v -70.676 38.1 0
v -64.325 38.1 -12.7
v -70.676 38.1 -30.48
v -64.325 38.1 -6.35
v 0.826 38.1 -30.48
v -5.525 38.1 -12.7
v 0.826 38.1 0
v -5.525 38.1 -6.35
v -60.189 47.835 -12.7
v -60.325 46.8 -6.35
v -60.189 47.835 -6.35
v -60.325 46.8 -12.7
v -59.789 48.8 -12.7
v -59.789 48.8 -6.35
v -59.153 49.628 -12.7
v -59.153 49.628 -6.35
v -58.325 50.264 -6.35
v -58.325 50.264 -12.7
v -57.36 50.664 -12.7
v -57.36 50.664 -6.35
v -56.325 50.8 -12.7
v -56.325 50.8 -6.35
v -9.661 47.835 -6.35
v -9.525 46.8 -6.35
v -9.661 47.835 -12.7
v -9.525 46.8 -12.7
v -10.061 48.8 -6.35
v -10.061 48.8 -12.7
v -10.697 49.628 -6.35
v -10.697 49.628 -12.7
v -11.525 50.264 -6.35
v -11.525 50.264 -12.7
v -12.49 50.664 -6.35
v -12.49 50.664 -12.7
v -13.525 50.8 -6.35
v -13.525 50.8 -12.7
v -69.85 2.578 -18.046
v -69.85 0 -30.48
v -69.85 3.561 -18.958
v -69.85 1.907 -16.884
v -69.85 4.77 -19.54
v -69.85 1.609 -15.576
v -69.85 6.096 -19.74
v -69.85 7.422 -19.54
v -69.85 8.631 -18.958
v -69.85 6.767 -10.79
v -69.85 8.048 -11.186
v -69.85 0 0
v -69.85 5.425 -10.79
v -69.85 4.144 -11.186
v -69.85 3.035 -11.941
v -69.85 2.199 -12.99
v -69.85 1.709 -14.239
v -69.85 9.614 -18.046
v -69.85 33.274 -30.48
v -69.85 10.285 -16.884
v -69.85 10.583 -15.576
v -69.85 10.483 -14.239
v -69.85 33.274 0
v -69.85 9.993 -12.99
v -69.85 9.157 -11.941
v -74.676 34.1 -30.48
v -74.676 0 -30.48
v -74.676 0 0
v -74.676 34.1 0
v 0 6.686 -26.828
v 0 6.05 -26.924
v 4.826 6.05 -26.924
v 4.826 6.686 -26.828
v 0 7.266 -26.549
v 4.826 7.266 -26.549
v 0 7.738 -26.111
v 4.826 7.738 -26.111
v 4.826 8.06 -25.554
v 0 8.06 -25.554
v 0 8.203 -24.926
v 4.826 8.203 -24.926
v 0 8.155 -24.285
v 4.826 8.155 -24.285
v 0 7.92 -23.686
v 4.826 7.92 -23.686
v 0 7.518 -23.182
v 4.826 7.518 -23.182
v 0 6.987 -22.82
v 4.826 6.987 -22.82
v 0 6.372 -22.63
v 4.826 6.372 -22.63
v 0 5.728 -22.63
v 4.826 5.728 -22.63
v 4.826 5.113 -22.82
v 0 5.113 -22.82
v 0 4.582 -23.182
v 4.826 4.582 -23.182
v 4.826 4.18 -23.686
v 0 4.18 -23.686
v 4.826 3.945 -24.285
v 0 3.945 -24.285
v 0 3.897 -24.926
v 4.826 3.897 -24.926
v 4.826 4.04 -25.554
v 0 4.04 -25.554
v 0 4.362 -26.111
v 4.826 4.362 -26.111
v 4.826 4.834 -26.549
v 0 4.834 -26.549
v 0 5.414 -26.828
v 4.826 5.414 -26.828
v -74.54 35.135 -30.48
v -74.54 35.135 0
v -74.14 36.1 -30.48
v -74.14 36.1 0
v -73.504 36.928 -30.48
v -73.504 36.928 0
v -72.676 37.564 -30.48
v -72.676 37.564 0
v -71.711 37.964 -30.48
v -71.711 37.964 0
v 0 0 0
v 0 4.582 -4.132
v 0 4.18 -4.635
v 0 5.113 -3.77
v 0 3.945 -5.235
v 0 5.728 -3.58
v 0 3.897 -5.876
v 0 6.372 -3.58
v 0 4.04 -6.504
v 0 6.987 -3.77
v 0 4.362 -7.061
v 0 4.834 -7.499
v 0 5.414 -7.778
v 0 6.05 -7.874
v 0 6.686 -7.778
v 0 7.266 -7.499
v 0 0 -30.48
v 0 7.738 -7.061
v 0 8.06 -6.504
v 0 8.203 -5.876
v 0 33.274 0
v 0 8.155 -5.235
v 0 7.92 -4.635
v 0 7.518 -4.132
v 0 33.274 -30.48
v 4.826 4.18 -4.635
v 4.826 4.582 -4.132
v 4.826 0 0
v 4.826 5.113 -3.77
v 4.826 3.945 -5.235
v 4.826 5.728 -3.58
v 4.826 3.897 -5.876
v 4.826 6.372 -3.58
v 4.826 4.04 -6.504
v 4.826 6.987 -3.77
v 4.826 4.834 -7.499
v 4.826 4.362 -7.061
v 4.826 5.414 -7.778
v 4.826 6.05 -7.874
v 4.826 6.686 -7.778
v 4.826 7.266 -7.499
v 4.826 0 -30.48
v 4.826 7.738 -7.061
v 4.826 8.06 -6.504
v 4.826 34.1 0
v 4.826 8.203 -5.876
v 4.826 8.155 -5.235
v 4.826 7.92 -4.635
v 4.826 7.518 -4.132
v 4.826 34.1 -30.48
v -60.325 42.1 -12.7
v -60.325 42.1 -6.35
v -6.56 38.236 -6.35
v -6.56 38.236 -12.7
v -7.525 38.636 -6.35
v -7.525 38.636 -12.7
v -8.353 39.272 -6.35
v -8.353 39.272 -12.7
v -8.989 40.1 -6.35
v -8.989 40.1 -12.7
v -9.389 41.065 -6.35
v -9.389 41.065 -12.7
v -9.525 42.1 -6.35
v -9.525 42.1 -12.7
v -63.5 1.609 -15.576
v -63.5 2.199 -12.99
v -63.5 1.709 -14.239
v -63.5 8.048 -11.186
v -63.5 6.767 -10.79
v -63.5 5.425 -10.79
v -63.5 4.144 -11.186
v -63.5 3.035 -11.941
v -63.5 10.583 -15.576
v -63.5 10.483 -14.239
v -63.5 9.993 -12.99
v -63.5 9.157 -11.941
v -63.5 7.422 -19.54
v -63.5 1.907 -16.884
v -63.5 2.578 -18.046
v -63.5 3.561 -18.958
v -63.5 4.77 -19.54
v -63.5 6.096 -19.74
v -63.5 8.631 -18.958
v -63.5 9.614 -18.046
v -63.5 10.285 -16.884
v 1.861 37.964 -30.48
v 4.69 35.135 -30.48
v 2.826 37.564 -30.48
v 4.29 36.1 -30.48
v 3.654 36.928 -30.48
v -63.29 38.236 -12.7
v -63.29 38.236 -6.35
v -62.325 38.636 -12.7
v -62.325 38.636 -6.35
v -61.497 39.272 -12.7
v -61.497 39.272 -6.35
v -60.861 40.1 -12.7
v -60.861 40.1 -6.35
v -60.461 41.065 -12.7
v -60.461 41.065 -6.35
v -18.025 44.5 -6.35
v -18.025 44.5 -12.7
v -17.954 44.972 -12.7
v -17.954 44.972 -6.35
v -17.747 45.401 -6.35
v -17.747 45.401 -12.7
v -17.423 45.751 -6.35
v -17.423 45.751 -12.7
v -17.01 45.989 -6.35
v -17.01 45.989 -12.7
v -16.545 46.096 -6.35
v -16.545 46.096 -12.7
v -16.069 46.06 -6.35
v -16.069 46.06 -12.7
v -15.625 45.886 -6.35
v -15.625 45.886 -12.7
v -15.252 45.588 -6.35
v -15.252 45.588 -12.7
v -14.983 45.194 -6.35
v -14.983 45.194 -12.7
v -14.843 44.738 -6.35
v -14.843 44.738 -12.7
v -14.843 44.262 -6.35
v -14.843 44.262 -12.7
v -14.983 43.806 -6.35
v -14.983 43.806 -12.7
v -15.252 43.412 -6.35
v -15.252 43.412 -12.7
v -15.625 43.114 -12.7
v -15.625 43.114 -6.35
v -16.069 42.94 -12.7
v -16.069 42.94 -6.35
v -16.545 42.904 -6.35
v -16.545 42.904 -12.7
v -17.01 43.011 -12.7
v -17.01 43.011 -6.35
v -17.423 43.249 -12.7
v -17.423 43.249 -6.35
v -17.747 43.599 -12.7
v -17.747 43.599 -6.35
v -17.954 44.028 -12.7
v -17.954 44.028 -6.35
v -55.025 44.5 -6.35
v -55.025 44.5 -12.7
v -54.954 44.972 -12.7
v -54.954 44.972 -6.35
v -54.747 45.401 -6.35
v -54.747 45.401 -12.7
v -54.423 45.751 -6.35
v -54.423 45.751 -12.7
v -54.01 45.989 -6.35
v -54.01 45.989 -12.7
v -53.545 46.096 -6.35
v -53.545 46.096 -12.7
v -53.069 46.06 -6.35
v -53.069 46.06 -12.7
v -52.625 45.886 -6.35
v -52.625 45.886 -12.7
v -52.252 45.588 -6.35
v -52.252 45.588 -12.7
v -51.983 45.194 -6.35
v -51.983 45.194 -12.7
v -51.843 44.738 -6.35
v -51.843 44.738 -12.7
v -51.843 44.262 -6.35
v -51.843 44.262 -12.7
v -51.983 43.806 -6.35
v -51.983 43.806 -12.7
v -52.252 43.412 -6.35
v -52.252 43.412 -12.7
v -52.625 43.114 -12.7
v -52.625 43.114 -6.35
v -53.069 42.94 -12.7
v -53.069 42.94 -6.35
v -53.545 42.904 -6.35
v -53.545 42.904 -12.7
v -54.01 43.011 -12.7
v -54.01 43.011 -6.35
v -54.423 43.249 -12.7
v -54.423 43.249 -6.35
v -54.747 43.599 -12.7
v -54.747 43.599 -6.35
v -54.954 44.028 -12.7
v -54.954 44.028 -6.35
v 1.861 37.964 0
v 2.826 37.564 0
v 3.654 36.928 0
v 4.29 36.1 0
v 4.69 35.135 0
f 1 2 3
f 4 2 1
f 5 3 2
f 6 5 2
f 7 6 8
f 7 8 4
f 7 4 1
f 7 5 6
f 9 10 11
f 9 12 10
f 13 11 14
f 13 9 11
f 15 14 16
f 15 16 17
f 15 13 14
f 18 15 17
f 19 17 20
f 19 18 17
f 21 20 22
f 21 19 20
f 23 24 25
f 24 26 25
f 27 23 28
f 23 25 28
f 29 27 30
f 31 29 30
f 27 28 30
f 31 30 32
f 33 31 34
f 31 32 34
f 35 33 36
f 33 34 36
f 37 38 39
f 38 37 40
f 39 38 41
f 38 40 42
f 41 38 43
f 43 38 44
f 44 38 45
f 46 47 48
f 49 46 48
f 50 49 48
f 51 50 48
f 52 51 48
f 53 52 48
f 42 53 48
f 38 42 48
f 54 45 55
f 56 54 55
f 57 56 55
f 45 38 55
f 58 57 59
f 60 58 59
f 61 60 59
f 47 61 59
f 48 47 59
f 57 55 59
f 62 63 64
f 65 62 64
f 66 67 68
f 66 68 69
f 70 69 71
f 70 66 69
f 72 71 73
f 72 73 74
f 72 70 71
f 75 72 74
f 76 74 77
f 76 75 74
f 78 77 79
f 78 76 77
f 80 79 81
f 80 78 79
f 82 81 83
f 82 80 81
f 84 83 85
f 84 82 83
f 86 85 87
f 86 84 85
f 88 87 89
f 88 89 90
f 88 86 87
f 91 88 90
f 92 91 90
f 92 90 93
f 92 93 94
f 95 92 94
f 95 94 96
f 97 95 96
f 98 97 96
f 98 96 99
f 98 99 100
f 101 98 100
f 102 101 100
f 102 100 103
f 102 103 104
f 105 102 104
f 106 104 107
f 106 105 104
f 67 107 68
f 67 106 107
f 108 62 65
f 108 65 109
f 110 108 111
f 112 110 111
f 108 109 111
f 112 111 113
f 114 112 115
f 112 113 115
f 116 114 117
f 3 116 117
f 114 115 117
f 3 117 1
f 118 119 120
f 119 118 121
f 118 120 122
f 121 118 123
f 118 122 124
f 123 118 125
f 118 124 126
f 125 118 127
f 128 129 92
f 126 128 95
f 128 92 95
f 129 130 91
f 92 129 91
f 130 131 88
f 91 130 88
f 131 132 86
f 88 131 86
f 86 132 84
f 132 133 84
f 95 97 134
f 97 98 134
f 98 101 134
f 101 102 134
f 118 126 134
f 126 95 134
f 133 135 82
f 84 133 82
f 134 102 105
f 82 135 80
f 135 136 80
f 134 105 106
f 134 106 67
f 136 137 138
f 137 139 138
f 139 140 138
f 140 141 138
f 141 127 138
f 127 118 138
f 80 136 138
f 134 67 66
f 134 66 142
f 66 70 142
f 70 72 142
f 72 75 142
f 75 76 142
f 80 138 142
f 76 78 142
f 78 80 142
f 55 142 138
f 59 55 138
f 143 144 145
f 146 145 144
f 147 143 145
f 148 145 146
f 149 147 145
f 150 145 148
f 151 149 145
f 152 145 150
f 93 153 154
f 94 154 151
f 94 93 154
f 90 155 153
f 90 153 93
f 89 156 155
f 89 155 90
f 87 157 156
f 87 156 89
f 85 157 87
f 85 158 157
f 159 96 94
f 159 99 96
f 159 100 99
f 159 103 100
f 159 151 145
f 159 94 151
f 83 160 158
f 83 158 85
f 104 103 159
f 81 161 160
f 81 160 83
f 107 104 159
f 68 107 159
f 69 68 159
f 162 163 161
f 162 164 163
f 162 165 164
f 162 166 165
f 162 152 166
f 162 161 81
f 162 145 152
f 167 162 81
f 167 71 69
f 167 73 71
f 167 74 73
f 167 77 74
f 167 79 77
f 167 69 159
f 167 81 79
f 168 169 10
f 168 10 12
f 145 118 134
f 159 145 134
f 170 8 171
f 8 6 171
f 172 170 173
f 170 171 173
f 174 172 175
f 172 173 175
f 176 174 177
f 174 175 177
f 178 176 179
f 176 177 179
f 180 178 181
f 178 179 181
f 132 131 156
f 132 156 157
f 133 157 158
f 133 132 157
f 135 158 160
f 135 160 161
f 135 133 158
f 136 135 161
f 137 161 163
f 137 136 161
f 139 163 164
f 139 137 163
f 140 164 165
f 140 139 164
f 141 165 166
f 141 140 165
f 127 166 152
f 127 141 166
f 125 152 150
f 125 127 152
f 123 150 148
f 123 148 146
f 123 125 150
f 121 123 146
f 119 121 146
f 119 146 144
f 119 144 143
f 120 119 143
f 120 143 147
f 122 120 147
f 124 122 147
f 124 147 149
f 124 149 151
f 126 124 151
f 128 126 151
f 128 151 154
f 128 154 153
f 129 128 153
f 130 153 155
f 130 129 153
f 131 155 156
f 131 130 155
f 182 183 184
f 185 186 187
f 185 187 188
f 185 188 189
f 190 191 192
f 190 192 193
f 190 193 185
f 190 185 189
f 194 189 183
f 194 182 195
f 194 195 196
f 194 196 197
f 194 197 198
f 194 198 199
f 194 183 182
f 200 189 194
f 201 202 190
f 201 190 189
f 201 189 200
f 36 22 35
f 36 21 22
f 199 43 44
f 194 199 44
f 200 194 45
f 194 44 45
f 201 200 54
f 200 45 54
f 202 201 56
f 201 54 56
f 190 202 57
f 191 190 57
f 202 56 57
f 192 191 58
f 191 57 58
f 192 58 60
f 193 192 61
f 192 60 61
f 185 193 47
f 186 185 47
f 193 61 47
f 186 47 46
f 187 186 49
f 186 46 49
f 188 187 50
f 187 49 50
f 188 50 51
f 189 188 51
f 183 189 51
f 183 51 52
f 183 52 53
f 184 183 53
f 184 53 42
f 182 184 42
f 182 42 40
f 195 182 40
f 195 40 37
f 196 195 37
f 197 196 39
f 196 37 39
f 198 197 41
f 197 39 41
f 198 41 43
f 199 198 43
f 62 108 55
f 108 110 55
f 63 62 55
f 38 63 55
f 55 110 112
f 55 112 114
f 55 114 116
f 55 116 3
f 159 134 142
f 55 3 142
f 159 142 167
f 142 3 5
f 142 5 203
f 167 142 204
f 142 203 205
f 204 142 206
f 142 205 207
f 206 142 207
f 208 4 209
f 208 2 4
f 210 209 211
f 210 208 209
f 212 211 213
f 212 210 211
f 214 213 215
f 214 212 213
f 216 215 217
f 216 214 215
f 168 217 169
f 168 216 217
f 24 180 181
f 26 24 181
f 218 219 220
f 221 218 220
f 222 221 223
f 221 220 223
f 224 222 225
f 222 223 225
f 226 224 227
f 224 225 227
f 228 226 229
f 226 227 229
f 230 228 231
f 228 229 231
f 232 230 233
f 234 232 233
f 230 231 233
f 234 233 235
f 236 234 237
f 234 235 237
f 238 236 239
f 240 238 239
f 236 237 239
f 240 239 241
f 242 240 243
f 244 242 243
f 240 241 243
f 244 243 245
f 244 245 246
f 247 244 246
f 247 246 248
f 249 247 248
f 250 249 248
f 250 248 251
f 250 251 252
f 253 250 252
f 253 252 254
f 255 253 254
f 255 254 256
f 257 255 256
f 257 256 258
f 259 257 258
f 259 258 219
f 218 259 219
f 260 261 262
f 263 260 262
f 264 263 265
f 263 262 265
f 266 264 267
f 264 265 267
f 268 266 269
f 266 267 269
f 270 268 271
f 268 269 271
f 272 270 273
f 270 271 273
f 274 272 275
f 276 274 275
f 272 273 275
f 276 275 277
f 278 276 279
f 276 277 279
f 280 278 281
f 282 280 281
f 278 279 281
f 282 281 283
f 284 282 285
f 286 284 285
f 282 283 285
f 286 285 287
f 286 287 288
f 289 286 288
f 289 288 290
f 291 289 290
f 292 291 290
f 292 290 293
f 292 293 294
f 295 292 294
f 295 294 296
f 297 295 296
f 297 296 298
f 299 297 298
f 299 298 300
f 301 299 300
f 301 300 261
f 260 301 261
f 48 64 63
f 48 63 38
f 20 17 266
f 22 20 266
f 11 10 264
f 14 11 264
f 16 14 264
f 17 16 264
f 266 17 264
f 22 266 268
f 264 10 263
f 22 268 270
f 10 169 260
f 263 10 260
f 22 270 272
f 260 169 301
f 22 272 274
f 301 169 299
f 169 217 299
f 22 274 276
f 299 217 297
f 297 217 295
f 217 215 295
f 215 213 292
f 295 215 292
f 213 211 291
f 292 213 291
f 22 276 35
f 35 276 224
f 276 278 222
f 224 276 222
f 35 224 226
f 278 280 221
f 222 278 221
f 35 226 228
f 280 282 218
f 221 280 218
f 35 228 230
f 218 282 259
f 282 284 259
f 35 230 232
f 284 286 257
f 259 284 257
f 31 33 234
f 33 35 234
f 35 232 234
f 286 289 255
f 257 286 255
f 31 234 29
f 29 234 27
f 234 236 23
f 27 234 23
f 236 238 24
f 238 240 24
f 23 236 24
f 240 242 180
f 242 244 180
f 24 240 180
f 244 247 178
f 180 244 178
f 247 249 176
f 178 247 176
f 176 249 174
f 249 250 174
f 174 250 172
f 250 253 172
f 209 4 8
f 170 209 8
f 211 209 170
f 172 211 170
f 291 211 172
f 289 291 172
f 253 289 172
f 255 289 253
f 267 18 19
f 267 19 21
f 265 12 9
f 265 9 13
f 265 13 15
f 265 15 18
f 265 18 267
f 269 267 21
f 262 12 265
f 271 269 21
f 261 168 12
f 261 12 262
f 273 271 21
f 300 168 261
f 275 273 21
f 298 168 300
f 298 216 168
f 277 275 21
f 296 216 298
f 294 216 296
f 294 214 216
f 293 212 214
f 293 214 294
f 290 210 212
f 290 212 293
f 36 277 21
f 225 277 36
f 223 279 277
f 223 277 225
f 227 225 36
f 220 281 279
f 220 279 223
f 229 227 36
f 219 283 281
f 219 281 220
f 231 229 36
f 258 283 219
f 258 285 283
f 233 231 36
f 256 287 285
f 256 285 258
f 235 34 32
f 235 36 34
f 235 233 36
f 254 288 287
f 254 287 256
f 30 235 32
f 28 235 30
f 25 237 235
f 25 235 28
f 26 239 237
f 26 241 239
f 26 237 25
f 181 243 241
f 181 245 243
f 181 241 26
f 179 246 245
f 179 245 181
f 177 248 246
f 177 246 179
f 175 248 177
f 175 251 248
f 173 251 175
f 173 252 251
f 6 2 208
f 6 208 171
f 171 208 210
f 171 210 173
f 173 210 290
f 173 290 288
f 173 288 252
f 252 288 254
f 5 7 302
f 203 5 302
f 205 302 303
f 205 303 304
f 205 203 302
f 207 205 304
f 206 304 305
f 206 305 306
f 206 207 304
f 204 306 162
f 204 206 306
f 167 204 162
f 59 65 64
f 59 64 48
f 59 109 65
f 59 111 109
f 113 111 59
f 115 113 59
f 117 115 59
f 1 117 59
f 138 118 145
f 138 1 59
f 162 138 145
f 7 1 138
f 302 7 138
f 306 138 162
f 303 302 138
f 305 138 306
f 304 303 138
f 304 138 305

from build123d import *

# Parameters (mm, degrees)
SKETCH2_W           = 30.48
SKETCH2_H           = 38.1
SKETCH2_R           = 2.159
BOSS_EXTRUDE1_DEPTH = 4.826
SKETCH3_W           = 30.48
SKETCH3_H           = 4.826
BOSS_EXTRUDE2_DEPTH = 74.676
SKETCH4_W           = 4.826
SKETCH4_H           = 30.48
BOSS_EXTRUDE4_DEPTH = 33.274
SKETCH5_W           = 50.8
SKETCH5_H           = 6.35
BOSS_EXTRUDE5_DEPTH = 12.7
CUT_EXTRUDE1_REACH  = 14.7
SKETCH6_R           = 1.6
FILLET2_R           = 4
SKETCH7_R           = 4.5
BOSS_EXTRUDE6_DEPTH = 6.35


with BuildPart() as part:
    # Sketch2 → Boss-Extrude1 (new body)
    with BuildSketch(Plane(origin=(0, 0, 0), x_dir=(0, 0, -1), z_dir=(1, 0, 0))):
        with Locations((15.24, 19.05)):
            Rectangle(SKETCH2_W, SKETCH2_H)
        with Locations((5.715, 6.05)):
            Circle(SKETCH2_R, mode=Mode.SUBTRACT)
        with Locations((24.765, 6.05)):
            Circle(SKETCH2_R, mode=Mode.SUBTRACT)
    extrude(amount=BOSS_EXTRUDE1_DEPTH)

    # Sketch3 → Boss-Extrude2 (add)
    with BuildSketch(Plane.ZY):
        with Locations((-15.24, 35.687)):
            Rectangle(SKETCH3_W, SKETCH3_H)
    extrude(amount=BOSS_EXTRUDE2_DEPTH)

    # Sketch4 → Boss-Extrude4 (add)
    with BuildSketch(Plane.XZ.offset(-33.274)):
        with Locations((-72.263, -15.24)):
            Rectangle(SKETCH4_W, SKETCH4_H)
    extrude(amount=BOSS_EXTRUDE4_DEPTH)

    # Sketch5 → Boss-Extrude5 (add)
    with BuildSketch(Plane(origin=(0, 38.1, 0), x_dir=(1, 0, 0), z_dir=(0, 1, 0))):
        with Locations((-34.925, 9.525)):
            Rectangle(SKETCH5_W, SKETCH5_H)
    extrude(amount=BOSS_EXTRUDE5_DEPTH)

    # Sketch6 → Cut-Extrude1 (cut, up to next)
    with BuildSketch(Plane(origin=(0, 0, -12.7), x_dir=(-1, 0, 0), z_dir=(0, 0, -1)), mode=Mode.PRIVATE) as cut_extrude1_sk1:
        with Locations((16.425, 44.5)):
            Circle(SKETCH6_R)
    cut_extrude1_tool1 = extrude(cut_extrude1_sk1.sketch, amount=-CUT_EXTRUDE1_REACH, mode=Mode.PRIVATE) & part.part
    add(cut_extrude1_tool1.solids().sort_by_distance((-16.425, 44.5, -12.7))[0], mode=Mode.SUBTRACT)
    # Sketch6 → Cut-Extrude1 (cut, up to next)
    with BuildSketch(Plane(origin=(0, 0, -12.7), x_dir=(-1, 0, 0), z_dir=(0, 0, -1)), mode=Mode.PRIVATE) as cut_extrude1_sk2:
        with Locations((53.425, 44.5)):
            Circle(SKETCH6_R)
    cut_extrude1_tool2 = extrude(cut_extrude1_sk2.sketch, amount=-CUT_EXTRUDE1_REACH, mode=Mode.PRIVATE) & part.part
    add(cut_extrude1_tool2.solids().sort_by_distance((-53.425, 44.5, -12.7))[0], mode=Mode.SUBTRACT)

    # Fillet2
    fillet2_edges = [part.edges().sort_by_distance(p)[0] for p in [
        (4.826, 38.1, -15.24),
        (-74.676, 38.1, -15.24),
        (-60.325, 38.1, -9.525),
        (-9.525, 38.1, -9.525),
        (-60.325, 50.8, -9.525),
        (-9.525, 50.8, -9.525),
    ]]
    fillet(fillet2_edges, radius=FILLET2_R)

    # Sketch7 → Boss-Extrude6 (add)
    with BuildSketch(Plane(origin=(-69.85, 0, 0), x_dir=(0, 0, -1), z_dir=(1, 0, 0))):
        with Locations((15.24, 6.096)):
            Circle(SKETCH7_R)
    extrude(amount=BOSS_EXTRUDE6_DEPTH)


solid = part.part
